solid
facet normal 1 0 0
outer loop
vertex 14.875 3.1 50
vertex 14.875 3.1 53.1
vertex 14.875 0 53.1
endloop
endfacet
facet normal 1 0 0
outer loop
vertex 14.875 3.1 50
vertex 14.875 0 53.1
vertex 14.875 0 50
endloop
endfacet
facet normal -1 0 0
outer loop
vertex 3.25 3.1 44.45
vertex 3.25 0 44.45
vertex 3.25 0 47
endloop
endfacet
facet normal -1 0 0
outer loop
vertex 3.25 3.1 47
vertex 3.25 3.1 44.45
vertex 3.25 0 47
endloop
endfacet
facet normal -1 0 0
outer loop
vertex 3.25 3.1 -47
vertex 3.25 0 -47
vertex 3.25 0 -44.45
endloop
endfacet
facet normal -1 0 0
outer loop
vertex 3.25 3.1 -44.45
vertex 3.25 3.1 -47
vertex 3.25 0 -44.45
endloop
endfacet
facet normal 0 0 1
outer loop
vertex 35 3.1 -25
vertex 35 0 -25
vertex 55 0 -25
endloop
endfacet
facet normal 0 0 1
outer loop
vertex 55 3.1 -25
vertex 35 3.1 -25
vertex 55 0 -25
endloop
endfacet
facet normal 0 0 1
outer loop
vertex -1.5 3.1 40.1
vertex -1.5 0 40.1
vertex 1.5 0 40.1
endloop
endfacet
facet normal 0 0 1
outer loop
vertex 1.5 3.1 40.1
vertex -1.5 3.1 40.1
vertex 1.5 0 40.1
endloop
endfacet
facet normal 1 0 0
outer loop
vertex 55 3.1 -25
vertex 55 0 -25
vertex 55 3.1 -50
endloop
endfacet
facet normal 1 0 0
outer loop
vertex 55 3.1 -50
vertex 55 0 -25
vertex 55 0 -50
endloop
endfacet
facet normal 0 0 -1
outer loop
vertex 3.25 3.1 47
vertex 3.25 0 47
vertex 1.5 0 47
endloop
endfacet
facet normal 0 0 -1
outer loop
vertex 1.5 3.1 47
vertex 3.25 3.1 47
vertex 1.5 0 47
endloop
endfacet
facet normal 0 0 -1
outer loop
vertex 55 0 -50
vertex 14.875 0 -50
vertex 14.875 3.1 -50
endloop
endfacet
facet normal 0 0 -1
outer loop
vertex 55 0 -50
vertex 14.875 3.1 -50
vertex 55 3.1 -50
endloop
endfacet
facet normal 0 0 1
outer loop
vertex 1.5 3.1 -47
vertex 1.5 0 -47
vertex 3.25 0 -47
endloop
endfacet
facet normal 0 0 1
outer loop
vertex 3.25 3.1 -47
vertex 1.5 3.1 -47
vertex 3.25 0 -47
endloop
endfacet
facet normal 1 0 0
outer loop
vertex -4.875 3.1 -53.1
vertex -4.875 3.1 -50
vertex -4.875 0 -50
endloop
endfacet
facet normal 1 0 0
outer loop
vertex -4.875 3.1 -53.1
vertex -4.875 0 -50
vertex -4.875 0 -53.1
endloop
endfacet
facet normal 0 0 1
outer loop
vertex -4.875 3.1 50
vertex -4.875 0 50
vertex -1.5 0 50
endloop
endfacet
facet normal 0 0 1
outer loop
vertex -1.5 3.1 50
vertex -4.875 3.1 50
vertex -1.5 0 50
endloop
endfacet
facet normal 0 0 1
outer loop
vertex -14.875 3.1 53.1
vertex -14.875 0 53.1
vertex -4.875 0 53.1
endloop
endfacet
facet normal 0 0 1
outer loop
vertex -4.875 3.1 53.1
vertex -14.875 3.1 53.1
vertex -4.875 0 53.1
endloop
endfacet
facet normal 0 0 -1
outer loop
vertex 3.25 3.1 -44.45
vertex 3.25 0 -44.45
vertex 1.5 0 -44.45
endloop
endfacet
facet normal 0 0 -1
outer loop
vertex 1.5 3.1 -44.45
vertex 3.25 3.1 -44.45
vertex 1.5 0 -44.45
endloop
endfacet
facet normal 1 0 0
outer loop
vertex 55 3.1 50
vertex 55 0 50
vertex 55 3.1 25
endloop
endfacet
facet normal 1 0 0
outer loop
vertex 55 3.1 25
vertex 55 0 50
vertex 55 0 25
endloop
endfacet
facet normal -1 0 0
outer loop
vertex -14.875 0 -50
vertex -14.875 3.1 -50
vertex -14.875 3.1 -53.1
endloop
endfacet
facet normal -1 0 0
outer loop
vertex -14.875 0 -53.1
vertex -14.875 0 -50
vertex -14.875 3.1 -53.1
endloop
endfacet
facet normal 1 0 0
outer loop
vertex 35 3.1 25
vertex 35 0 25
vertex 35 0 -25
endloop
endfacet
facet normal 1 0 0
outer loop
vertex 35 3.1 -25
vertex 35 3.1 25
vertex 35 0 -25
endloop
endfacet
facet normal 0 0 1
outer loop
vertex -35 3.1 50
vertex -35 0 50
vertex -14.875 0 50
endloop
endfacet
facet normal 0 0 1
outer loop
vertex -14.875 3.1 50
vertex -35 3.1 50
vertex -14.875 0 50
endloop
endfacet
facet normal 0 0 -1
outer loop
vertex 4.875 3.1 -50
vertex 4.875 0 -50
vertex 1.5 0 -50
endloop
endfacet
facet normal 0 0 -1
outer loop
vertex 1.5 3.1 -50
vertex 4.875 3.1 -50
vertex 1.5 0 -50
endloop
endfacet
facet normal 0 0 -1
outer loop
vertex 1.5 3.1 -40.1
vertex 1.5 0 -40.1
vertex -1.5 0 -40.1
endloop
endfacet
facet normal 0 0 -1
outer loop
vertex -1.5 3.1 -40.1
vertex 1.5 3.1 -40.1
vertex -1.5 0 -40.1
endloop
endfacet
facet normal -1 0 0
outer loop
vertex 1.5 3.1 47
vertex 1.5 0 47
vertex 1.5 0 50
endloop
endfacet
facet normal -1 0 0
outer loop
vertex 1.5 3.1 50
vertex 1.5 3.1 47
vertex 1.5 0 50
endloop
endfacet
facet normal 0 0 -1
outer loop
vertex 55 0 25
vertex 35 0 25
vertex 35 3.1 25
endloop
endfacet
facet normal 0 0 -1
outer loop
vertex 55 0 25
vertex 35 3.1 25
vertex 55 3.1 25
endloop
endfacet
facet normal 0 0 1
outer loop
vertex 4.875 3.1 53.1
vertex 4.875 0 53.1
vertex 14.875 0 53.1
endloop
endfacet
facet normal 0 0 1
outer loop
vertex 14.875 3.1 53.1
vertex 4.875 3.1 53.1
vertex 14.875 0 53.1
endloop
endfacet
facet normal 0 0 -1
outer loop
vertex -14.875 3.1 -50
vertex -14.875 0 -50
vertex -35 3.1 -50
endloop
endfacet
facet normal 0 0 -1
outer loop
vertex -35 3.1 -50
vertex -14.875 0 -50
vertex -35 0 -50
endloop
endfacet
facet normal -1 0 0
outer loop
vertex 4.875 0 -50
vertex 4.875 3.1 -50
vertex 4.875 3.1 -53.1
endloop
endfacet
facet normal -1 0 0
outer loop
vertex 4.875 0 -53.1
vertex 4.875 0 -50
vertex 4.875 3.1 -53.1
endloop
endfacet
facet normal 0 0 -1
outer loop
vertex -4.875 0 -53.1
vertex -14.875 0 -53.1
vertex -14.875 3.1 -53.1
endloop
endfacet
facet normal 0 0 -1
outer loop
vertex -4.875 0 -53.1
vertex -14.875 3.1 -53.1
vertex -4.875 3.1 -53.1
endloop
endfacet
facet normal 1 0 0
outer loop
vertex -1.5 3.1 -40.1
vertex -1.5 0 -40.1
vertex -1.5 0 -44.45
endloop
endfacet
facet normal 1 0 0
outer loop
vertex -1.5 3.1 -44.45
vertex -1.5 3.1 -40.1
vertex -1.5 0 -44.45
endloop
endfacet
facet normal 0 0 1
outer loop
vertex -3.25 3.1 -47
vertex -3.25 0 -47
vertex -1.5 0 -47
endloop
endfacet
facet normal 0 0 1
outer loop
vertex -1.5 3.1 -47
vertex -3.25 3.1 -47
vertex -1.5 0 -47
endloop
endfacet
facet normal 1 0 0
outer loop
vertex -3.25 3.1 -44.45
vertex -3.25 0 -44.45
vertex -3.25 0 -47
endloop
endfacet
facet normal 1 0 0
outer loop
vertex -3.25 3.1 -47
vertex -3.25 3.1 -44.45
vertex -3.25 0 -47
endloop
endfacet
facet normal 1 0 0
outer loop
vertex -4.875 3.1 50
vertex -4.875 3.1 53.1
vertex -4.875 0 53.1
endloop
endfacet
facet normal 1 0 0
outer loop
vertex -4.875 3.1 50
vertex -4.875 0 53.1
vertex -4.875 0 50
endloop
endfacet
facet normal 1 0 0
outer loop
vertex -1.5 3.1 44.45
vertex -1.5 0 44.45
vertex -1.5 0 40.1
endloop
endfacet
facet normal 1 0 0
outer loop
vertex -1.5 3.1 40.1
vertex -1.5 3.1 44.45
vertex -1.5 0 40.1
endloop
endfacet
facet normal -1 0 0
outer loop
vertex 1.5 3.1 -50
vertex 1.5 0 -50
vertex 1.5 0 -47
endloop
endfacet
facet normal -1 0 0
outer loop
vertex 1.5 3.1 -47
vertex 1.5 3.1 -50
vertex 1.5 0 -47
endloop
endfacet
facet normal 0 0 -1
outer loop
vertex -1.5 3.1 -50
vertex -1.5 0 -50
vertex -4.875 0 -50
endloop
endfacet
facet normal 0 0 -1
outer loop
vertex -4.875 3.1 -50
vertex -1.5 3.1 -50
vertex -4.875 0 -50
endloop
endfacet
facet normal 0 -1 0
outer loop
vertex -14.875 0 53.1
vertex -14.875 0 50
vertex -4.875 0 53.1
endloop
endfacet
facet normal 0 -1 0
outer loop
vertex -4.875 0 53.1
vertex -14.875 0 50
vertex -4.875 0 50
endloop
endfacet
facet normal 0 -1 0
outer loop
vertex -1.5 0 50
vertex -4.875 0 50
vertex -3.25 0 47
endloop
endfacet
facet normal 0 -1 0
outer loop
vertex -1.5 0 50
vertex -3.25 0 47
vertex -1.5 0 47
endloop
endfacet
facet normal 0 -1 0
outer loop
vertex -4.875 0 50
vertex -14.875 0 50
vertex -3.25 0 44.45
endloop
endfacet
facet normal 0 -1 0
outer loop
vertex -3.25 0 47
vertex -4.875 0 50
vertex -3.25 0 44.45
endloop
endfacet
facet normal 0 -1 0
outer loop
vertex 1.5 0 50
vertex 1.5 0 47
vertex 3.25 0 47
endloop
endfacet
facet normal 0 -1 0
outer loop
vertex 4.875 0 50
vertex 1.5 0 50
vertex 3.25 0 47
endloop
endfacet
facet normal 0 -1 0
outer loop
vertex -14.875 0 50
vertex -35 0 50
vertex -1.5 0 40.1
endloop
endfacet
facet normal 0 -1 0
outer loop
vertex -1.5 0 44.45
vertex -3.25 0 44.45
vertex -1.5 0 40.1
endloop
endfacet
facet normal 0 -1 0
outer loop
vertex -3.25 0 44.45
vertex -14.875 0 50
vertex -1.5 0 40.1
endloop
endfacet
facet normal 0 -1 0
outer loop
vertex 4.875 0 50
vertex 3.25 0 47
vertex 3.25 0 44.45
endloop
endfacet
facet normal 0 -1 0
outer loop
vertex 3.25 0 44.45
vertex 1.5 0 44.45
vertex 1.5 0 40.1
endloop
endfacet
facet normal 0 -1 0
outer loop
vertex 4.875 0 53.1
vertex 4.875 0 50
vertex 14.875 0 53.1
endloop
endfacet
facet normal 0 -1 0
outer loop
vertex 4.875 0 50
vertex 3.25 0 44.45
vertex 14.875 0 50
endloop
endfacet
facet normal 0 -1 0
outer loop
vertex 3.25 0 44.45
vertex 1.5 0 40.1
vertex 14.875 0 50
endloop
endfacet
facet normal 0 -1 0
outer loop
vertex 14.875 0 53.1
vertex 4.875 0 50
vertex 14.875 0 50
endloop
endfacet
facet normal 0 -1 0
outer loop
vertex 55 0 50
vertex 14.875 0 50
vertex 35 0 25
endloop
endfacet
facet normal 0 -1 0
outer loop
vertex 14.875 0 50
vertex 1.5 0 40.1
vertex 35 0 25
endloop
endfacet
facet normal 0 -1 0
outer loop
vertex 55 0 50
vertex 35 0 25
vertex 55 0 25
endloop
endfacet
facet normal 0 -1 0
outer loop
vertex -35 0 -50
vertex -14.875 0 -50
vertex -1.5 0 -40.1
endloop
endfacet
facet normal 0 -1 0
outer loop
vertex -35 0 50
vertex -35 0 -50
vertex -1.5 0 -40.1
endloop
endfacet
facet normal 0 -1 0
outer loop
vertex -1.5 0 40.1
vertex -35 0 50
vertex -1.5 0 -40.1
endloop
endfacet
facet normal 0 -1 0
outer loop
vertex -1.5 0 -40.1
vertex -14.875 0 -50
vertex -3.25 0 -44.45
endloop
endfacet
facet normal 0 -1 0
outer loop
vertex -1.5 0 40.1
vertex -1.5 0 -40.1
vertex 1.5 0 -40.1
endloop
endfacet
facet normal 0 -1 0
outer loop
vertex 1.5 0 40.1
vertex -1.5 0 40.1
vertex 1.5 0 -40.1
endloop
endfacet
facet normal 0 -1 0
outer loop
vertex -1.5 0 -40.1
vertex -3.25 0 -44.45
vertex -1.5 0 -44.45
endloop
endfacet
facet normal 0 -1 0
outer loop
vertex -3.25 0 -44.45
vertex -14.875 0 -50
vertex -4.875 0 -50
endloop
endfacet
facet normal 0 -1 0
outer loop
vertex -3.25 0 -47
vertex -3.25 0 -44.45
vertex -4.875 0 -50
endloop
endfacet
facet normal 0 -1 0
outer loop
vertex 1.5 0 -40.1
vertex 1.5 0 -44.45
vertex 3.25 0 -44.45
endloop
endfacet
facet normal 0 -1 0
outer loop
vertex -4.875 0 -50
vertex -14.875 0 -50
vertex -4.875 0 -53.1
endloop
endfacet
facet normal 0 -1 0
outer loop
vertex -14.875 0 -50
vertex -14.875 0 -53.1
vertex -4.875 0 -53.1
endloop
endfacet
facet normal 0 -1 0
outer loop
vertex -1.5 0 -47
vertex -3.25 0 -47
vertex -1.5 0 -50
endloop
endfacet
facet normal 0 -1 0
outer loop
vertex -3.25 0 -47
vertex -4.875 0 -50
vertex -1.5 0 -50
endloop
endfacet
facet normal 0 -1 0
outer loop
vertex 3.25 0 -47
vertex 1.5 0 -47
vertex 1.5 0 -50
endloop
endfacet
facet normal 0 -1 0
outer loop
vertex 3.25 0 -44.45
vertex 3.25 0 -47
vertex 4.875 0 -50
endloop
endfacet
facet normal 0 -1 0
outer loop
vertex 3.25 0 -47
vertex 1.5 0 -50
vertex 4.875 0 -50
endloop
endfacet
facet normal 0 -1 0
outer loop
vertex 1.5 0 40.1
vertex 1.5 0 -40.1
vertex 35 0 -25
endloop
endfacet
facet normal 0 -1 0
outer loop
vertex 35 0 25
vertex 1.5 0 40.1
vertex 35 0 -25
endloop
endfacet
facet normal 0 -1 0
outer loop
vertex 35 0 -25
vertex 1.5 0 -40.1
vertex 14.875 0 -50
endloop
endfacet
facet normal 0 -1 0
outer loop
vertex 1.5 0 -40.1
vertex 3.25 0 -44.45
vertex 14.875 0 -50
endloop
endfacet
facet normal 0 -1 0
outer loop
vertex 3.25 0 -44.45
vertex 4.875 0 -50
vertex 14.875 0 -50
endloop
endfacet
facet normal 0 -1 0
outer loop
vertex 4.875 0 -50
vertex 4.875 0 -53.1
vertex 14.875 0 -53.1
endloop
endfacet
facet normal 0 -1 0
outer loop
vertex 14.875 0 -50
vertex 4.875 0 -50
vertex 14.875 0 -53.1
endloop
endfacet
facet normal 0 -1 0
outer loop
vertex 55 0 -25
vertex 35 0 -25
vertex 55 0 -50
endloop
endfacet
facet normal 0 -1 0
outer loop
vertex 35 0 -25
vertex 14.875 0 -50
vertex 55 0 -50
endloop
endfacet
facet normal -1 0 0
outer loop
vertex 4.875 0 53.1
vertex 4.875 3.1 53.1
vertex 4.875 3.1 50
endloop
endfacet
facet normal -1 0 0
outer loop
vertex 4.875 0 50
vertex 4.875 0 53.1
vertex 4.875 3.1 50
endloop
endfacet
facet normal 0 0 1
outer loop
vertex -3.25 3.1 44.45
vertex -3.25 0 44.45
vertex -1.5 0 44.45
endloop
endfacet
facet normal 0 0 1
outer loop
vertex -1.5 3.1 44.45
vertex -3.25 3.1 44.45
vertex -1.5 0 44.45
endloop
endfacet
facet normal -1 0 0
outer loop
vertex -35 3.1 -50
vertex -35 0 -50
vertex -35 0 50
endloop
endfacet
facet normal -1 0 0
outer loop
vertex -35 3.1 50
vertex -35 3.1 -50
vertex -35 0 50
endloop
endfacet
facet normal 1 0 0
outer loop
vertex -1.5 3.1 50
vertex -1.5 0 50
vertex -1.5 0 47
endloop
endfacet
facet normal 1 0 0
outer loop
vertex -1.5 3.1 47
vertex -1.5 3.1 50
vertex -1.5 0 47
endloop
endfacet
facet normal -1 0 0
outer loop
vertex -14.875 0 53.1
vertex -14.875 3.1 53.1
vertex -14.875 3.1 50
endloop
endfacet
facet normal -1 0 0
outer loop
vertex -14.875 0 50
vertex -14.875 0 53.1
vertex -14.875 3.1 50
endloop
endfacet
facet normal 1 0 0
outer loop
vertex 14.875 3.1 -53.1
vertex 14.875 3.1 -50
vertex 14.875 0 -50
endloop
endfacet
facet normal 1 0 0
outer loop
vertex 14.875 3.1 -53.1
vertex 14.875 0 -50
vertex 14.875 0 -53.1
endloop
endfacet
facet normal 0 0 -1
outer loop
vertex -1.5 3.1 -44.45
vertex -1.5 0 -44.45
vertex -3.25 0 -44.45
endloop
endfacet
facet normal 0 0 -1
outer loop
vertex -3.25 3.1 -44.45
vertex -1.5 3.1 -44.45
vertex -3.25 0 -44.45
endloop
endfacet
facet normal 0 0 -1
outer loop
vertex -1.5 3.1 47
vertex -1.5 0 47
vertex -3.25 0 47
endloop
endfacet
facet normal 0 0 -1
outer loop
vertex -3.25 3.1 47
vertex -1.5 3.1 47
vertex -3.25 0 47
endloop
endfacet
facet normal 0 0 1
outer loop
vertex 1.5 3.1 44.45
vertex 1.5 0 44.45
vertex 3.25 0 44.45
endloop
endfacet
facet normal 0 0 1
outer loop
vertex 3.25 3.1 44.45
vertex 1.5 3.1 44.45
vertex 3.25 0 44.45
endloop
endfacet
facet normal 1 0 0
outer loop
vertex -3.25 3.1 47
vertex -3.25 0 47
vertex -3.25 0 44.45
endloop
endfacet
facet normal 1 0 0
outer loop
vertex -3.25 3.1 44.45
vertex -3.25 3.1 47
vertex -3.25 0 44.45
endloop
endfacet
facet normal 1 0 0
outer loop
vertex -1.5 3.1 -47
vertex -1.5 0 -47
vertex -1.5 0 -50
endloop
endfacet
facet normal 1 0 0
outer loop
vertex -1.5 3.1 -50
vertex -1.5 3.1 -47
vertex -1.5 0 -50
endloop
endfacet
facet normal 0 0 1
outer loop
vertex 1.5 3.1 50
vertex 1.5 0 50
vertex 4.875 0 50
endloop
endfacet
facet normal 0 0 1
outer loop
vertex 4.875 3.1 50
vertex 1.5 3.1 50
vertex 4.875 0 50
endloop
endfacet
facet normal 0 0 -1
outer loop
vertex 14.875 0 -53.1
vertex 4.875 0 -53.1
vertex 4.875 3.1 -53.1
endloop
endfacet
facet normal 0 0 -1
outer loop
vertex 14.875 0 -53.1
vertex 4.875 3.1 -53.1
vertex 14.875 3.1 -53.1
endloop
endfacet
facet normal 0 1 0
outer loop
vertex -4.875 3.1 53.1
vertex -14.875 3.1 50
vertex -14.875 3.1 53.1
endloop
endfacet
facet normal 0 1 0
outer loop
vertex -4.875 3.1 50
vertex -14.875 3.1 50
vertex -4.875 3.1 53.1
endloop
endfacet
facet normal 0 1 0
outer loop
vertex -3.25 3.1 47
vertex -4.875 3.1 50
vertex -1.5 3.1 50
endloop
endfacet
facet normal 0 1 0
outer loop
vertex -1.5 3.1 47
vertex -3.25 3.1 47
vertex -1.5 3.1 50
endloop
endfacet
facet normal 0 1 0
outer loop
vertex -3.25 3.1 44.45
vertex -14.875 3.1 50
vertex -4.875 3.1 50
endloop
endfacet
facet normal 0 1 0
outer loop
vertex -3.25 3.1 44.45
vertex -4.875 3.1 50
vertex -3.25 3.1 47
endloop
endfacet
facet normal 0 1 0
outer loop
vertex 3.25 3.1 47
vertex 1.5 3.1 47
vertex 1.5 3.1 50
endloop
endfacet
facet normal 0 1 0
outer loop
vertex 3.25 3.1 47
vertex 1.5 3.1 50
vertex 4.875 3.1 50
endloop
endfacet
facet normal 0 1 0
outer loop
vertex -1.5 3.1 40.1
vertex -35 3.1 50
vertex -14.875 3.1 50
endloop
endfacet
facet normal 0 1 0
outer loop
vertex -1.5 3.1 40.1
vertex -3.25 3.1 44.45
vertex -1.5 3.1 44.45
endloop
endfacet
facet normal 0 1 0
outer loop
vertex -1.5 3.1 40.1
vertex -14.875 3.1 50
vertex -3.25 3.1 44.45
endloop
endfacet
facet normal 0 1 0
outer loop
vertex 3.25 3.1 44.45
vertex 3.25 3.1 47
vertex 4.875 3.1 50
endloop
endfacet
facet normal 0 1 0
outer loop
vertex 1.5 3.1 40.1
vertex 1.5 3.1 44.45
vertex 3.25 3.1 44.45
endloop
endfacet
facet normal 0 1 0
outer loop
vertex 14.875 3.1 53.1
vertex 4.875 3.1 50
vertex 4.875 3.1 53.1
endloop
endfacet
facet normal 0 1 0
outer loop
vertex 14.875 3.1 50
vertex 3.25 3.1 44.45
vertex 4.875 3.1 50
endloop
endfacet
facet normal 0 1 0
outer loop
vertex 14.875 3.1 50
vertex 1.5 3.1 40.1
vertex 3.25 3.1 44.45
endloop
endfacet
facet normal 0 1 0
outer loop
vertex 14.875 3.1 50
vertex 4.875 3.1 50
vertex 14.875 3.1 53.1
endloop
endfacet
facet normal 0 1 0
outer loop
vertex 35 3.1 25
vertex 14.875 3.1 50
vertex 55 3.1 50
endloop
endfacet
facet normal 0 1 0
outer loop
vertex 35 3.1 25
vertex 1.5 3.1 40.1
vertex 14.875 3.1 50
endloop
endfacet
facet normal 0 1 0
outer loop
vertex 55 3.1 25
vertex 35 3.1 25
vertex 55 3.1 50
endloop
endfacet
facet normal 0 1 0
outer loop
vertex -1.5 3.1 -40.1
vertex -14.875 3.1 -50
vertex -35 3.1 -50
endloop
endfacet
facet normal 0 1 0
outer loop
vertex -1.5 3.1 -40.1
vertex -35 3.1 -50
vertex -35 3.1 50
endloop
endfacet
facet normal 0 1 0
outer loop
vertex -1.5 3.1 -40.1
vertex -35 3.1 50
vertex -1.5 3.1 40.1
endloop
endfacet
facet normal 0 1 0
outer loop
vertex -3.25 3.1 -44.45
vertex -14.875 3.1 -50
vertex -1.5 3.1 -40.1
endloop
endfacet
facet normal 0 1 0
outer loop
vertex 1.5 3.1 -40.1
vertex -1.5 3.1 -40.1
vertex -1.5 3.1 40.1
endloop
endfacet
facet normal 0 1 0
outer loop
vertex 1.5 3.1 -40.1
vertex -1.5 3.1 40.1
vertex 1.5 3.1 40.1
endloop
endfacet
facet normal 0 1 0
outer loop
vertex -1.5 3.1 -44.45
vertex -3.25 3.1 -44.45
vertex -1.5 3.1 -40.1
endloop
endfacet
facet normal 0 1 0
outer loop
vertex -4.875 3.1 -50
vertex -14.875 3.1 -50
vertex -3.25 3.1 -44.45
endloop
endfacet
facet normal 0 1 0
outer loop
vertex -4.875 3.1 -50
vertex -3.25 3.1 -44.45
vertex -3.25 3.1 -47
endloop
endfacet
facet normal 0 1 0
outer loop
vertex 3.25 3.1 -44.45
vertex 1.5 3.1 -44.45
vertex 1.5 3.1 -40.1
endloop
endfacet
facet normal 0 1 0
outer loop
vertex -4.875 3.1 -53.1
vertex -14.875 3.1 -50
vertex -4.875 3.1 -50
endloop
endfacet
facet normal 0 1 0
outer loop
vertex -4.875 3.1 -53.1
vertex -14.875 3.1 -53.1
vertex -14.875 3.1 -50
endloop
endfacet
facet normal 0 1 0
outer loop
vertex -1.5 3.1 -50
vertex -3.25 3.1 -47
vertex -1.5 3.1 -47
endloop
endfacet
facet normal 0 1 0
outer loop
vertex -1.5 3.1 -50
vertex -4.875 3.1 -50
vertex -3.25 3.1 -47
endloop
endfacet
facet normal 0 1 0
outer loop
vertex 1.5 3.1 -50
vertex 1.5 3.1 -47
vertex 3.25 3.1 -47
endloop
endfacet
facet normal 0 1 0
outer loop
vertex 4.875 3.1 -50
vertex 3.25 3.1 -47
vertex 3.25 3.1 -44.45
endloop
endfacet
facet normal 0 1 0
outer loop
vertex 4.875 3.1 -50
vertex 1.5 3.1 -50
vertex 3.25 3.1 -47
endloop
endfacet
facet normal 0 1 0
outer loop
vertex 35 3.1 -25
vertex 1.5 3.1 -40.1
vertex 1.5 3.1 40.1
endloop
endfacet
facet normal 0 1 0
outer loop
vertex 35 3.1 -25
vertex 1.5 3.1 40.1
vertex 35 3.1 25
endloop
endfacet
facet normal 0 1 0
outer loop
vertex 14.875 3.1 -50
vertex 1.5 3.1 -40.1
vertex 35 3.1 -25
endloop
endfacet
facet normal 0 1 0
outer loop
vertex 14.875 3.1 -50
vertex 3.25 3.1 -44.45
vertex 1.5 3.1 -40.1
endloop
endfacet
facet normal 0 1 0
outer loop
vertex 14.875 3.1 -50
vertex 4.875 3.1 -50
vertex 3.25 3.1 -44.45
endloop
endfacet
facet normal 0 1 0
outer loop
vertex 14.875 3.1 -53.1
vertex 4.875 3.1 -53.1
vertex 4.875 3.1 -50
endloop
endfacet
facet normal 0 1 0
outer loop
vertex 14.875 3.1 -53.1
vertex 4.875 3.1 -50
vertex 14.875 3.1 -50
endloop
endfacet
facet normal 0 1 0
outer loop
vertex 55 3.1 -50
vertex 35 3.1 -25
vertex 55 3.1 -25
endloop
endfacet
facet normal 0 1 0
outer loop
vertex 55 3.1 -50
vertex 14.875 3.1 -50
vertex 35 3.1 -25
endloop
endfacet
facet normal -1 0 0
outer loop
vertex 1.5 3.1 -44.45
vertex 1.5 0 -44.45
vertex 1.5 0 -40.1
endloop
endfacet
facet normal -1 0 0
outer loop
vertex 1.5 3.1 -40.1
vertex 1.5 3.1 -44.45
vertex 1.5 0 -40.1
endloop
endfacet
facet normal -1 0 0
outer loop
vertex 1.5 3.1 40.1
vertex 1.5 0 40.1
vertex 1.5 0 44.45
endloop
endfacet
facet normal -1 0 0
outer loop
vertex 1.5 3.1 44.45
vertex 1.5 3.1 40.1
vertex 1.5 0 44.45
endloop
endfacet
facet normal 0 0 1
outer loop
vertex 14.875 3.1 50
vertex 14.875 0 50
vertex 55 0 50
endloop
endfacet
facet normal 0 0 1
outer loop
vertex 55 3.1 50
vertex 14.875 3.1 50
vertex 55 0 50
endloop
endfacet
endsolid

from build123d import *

# Parameters (mm, degrees)
SKETCH_1_W      = 10
SKETCH_1_H      = 3.1
EXTRUDE_1_DEPTH = 3.1
SKETCH_2_W      = 20
SKETCH_2_H      = 25
EXTRUDE_2_DEPTH = 3.1


with BuildPart() as part:
    # 草图1 → 凸台-拉伸1 (new body)
    with BuildSketch(Plane(origin=(0, 0, 0), x_dir=(1, 0, 0), z_dir=(0, 1, 0))):
        Polygon((-35, 50), (-35, -50), (-14.875, -50), (-4.875, -50), (-1.5, -50), (-1.5, -47), (-3.25, -47), (-3.25, -44.45), (-1.5, -44.45), (-1.5, -40.1), (1.5, -40.1), (1.5, -44.45), (3.25, -44.45), (3.25, -47), (1.5, -47), (1.5, -50), (4.875, -50), (14.875, -50), (35, -50), (35, 50), (14.875, 50), (4.875, 50), (1.5, 50), (1.5, 47), (3.25, 47), (3.25, 44.45), (1.5, 44.45), (1.5, 40.1), (-1.5, 40.1), (-1.5, 44.45), (-3.25, 44.45), (-3.25, 47), (-1.5, 47), (-1.5, 50), (-4.875, 50), (-14.875, 50), align=None)
        with Locations((-9.875, 51.55)):
            Rectangle(SKETCH_1_W, SKETCH_1_H)
        with Locations((9.875, 51.55)):
            Rectangle(SKETCH_1_W, SKETCH_1_H)
        with Locations((-9.875, -51.55)):
            Rectangle(SKETCH_1_W, SKETCH_1_H)
        with Locations((9.875, -51.55)):
            Rectangle(SKETCH_1_W, SKETCH_1_H)
    extrude(amount=EXTRUDE_1_DEPTH)

    # 草图2 → 凸台-拉伸2 (add)
    with BuildSketch(Plane(origin=(0, 0, 0), x_dir=(1, 0, 0), z_dir=(0, 1, 0))):
        with Locations((45, 37.5)):
            Rectangle(SKETCH_2_W, SKETCH_2_H)
        with Locations((45, -37.5)):
            Rectangle(SKETCH_2_W, SKETCH_2_H)
    extrude(amount=EXTRUDE_2_DEPTH)


solid = part.part
